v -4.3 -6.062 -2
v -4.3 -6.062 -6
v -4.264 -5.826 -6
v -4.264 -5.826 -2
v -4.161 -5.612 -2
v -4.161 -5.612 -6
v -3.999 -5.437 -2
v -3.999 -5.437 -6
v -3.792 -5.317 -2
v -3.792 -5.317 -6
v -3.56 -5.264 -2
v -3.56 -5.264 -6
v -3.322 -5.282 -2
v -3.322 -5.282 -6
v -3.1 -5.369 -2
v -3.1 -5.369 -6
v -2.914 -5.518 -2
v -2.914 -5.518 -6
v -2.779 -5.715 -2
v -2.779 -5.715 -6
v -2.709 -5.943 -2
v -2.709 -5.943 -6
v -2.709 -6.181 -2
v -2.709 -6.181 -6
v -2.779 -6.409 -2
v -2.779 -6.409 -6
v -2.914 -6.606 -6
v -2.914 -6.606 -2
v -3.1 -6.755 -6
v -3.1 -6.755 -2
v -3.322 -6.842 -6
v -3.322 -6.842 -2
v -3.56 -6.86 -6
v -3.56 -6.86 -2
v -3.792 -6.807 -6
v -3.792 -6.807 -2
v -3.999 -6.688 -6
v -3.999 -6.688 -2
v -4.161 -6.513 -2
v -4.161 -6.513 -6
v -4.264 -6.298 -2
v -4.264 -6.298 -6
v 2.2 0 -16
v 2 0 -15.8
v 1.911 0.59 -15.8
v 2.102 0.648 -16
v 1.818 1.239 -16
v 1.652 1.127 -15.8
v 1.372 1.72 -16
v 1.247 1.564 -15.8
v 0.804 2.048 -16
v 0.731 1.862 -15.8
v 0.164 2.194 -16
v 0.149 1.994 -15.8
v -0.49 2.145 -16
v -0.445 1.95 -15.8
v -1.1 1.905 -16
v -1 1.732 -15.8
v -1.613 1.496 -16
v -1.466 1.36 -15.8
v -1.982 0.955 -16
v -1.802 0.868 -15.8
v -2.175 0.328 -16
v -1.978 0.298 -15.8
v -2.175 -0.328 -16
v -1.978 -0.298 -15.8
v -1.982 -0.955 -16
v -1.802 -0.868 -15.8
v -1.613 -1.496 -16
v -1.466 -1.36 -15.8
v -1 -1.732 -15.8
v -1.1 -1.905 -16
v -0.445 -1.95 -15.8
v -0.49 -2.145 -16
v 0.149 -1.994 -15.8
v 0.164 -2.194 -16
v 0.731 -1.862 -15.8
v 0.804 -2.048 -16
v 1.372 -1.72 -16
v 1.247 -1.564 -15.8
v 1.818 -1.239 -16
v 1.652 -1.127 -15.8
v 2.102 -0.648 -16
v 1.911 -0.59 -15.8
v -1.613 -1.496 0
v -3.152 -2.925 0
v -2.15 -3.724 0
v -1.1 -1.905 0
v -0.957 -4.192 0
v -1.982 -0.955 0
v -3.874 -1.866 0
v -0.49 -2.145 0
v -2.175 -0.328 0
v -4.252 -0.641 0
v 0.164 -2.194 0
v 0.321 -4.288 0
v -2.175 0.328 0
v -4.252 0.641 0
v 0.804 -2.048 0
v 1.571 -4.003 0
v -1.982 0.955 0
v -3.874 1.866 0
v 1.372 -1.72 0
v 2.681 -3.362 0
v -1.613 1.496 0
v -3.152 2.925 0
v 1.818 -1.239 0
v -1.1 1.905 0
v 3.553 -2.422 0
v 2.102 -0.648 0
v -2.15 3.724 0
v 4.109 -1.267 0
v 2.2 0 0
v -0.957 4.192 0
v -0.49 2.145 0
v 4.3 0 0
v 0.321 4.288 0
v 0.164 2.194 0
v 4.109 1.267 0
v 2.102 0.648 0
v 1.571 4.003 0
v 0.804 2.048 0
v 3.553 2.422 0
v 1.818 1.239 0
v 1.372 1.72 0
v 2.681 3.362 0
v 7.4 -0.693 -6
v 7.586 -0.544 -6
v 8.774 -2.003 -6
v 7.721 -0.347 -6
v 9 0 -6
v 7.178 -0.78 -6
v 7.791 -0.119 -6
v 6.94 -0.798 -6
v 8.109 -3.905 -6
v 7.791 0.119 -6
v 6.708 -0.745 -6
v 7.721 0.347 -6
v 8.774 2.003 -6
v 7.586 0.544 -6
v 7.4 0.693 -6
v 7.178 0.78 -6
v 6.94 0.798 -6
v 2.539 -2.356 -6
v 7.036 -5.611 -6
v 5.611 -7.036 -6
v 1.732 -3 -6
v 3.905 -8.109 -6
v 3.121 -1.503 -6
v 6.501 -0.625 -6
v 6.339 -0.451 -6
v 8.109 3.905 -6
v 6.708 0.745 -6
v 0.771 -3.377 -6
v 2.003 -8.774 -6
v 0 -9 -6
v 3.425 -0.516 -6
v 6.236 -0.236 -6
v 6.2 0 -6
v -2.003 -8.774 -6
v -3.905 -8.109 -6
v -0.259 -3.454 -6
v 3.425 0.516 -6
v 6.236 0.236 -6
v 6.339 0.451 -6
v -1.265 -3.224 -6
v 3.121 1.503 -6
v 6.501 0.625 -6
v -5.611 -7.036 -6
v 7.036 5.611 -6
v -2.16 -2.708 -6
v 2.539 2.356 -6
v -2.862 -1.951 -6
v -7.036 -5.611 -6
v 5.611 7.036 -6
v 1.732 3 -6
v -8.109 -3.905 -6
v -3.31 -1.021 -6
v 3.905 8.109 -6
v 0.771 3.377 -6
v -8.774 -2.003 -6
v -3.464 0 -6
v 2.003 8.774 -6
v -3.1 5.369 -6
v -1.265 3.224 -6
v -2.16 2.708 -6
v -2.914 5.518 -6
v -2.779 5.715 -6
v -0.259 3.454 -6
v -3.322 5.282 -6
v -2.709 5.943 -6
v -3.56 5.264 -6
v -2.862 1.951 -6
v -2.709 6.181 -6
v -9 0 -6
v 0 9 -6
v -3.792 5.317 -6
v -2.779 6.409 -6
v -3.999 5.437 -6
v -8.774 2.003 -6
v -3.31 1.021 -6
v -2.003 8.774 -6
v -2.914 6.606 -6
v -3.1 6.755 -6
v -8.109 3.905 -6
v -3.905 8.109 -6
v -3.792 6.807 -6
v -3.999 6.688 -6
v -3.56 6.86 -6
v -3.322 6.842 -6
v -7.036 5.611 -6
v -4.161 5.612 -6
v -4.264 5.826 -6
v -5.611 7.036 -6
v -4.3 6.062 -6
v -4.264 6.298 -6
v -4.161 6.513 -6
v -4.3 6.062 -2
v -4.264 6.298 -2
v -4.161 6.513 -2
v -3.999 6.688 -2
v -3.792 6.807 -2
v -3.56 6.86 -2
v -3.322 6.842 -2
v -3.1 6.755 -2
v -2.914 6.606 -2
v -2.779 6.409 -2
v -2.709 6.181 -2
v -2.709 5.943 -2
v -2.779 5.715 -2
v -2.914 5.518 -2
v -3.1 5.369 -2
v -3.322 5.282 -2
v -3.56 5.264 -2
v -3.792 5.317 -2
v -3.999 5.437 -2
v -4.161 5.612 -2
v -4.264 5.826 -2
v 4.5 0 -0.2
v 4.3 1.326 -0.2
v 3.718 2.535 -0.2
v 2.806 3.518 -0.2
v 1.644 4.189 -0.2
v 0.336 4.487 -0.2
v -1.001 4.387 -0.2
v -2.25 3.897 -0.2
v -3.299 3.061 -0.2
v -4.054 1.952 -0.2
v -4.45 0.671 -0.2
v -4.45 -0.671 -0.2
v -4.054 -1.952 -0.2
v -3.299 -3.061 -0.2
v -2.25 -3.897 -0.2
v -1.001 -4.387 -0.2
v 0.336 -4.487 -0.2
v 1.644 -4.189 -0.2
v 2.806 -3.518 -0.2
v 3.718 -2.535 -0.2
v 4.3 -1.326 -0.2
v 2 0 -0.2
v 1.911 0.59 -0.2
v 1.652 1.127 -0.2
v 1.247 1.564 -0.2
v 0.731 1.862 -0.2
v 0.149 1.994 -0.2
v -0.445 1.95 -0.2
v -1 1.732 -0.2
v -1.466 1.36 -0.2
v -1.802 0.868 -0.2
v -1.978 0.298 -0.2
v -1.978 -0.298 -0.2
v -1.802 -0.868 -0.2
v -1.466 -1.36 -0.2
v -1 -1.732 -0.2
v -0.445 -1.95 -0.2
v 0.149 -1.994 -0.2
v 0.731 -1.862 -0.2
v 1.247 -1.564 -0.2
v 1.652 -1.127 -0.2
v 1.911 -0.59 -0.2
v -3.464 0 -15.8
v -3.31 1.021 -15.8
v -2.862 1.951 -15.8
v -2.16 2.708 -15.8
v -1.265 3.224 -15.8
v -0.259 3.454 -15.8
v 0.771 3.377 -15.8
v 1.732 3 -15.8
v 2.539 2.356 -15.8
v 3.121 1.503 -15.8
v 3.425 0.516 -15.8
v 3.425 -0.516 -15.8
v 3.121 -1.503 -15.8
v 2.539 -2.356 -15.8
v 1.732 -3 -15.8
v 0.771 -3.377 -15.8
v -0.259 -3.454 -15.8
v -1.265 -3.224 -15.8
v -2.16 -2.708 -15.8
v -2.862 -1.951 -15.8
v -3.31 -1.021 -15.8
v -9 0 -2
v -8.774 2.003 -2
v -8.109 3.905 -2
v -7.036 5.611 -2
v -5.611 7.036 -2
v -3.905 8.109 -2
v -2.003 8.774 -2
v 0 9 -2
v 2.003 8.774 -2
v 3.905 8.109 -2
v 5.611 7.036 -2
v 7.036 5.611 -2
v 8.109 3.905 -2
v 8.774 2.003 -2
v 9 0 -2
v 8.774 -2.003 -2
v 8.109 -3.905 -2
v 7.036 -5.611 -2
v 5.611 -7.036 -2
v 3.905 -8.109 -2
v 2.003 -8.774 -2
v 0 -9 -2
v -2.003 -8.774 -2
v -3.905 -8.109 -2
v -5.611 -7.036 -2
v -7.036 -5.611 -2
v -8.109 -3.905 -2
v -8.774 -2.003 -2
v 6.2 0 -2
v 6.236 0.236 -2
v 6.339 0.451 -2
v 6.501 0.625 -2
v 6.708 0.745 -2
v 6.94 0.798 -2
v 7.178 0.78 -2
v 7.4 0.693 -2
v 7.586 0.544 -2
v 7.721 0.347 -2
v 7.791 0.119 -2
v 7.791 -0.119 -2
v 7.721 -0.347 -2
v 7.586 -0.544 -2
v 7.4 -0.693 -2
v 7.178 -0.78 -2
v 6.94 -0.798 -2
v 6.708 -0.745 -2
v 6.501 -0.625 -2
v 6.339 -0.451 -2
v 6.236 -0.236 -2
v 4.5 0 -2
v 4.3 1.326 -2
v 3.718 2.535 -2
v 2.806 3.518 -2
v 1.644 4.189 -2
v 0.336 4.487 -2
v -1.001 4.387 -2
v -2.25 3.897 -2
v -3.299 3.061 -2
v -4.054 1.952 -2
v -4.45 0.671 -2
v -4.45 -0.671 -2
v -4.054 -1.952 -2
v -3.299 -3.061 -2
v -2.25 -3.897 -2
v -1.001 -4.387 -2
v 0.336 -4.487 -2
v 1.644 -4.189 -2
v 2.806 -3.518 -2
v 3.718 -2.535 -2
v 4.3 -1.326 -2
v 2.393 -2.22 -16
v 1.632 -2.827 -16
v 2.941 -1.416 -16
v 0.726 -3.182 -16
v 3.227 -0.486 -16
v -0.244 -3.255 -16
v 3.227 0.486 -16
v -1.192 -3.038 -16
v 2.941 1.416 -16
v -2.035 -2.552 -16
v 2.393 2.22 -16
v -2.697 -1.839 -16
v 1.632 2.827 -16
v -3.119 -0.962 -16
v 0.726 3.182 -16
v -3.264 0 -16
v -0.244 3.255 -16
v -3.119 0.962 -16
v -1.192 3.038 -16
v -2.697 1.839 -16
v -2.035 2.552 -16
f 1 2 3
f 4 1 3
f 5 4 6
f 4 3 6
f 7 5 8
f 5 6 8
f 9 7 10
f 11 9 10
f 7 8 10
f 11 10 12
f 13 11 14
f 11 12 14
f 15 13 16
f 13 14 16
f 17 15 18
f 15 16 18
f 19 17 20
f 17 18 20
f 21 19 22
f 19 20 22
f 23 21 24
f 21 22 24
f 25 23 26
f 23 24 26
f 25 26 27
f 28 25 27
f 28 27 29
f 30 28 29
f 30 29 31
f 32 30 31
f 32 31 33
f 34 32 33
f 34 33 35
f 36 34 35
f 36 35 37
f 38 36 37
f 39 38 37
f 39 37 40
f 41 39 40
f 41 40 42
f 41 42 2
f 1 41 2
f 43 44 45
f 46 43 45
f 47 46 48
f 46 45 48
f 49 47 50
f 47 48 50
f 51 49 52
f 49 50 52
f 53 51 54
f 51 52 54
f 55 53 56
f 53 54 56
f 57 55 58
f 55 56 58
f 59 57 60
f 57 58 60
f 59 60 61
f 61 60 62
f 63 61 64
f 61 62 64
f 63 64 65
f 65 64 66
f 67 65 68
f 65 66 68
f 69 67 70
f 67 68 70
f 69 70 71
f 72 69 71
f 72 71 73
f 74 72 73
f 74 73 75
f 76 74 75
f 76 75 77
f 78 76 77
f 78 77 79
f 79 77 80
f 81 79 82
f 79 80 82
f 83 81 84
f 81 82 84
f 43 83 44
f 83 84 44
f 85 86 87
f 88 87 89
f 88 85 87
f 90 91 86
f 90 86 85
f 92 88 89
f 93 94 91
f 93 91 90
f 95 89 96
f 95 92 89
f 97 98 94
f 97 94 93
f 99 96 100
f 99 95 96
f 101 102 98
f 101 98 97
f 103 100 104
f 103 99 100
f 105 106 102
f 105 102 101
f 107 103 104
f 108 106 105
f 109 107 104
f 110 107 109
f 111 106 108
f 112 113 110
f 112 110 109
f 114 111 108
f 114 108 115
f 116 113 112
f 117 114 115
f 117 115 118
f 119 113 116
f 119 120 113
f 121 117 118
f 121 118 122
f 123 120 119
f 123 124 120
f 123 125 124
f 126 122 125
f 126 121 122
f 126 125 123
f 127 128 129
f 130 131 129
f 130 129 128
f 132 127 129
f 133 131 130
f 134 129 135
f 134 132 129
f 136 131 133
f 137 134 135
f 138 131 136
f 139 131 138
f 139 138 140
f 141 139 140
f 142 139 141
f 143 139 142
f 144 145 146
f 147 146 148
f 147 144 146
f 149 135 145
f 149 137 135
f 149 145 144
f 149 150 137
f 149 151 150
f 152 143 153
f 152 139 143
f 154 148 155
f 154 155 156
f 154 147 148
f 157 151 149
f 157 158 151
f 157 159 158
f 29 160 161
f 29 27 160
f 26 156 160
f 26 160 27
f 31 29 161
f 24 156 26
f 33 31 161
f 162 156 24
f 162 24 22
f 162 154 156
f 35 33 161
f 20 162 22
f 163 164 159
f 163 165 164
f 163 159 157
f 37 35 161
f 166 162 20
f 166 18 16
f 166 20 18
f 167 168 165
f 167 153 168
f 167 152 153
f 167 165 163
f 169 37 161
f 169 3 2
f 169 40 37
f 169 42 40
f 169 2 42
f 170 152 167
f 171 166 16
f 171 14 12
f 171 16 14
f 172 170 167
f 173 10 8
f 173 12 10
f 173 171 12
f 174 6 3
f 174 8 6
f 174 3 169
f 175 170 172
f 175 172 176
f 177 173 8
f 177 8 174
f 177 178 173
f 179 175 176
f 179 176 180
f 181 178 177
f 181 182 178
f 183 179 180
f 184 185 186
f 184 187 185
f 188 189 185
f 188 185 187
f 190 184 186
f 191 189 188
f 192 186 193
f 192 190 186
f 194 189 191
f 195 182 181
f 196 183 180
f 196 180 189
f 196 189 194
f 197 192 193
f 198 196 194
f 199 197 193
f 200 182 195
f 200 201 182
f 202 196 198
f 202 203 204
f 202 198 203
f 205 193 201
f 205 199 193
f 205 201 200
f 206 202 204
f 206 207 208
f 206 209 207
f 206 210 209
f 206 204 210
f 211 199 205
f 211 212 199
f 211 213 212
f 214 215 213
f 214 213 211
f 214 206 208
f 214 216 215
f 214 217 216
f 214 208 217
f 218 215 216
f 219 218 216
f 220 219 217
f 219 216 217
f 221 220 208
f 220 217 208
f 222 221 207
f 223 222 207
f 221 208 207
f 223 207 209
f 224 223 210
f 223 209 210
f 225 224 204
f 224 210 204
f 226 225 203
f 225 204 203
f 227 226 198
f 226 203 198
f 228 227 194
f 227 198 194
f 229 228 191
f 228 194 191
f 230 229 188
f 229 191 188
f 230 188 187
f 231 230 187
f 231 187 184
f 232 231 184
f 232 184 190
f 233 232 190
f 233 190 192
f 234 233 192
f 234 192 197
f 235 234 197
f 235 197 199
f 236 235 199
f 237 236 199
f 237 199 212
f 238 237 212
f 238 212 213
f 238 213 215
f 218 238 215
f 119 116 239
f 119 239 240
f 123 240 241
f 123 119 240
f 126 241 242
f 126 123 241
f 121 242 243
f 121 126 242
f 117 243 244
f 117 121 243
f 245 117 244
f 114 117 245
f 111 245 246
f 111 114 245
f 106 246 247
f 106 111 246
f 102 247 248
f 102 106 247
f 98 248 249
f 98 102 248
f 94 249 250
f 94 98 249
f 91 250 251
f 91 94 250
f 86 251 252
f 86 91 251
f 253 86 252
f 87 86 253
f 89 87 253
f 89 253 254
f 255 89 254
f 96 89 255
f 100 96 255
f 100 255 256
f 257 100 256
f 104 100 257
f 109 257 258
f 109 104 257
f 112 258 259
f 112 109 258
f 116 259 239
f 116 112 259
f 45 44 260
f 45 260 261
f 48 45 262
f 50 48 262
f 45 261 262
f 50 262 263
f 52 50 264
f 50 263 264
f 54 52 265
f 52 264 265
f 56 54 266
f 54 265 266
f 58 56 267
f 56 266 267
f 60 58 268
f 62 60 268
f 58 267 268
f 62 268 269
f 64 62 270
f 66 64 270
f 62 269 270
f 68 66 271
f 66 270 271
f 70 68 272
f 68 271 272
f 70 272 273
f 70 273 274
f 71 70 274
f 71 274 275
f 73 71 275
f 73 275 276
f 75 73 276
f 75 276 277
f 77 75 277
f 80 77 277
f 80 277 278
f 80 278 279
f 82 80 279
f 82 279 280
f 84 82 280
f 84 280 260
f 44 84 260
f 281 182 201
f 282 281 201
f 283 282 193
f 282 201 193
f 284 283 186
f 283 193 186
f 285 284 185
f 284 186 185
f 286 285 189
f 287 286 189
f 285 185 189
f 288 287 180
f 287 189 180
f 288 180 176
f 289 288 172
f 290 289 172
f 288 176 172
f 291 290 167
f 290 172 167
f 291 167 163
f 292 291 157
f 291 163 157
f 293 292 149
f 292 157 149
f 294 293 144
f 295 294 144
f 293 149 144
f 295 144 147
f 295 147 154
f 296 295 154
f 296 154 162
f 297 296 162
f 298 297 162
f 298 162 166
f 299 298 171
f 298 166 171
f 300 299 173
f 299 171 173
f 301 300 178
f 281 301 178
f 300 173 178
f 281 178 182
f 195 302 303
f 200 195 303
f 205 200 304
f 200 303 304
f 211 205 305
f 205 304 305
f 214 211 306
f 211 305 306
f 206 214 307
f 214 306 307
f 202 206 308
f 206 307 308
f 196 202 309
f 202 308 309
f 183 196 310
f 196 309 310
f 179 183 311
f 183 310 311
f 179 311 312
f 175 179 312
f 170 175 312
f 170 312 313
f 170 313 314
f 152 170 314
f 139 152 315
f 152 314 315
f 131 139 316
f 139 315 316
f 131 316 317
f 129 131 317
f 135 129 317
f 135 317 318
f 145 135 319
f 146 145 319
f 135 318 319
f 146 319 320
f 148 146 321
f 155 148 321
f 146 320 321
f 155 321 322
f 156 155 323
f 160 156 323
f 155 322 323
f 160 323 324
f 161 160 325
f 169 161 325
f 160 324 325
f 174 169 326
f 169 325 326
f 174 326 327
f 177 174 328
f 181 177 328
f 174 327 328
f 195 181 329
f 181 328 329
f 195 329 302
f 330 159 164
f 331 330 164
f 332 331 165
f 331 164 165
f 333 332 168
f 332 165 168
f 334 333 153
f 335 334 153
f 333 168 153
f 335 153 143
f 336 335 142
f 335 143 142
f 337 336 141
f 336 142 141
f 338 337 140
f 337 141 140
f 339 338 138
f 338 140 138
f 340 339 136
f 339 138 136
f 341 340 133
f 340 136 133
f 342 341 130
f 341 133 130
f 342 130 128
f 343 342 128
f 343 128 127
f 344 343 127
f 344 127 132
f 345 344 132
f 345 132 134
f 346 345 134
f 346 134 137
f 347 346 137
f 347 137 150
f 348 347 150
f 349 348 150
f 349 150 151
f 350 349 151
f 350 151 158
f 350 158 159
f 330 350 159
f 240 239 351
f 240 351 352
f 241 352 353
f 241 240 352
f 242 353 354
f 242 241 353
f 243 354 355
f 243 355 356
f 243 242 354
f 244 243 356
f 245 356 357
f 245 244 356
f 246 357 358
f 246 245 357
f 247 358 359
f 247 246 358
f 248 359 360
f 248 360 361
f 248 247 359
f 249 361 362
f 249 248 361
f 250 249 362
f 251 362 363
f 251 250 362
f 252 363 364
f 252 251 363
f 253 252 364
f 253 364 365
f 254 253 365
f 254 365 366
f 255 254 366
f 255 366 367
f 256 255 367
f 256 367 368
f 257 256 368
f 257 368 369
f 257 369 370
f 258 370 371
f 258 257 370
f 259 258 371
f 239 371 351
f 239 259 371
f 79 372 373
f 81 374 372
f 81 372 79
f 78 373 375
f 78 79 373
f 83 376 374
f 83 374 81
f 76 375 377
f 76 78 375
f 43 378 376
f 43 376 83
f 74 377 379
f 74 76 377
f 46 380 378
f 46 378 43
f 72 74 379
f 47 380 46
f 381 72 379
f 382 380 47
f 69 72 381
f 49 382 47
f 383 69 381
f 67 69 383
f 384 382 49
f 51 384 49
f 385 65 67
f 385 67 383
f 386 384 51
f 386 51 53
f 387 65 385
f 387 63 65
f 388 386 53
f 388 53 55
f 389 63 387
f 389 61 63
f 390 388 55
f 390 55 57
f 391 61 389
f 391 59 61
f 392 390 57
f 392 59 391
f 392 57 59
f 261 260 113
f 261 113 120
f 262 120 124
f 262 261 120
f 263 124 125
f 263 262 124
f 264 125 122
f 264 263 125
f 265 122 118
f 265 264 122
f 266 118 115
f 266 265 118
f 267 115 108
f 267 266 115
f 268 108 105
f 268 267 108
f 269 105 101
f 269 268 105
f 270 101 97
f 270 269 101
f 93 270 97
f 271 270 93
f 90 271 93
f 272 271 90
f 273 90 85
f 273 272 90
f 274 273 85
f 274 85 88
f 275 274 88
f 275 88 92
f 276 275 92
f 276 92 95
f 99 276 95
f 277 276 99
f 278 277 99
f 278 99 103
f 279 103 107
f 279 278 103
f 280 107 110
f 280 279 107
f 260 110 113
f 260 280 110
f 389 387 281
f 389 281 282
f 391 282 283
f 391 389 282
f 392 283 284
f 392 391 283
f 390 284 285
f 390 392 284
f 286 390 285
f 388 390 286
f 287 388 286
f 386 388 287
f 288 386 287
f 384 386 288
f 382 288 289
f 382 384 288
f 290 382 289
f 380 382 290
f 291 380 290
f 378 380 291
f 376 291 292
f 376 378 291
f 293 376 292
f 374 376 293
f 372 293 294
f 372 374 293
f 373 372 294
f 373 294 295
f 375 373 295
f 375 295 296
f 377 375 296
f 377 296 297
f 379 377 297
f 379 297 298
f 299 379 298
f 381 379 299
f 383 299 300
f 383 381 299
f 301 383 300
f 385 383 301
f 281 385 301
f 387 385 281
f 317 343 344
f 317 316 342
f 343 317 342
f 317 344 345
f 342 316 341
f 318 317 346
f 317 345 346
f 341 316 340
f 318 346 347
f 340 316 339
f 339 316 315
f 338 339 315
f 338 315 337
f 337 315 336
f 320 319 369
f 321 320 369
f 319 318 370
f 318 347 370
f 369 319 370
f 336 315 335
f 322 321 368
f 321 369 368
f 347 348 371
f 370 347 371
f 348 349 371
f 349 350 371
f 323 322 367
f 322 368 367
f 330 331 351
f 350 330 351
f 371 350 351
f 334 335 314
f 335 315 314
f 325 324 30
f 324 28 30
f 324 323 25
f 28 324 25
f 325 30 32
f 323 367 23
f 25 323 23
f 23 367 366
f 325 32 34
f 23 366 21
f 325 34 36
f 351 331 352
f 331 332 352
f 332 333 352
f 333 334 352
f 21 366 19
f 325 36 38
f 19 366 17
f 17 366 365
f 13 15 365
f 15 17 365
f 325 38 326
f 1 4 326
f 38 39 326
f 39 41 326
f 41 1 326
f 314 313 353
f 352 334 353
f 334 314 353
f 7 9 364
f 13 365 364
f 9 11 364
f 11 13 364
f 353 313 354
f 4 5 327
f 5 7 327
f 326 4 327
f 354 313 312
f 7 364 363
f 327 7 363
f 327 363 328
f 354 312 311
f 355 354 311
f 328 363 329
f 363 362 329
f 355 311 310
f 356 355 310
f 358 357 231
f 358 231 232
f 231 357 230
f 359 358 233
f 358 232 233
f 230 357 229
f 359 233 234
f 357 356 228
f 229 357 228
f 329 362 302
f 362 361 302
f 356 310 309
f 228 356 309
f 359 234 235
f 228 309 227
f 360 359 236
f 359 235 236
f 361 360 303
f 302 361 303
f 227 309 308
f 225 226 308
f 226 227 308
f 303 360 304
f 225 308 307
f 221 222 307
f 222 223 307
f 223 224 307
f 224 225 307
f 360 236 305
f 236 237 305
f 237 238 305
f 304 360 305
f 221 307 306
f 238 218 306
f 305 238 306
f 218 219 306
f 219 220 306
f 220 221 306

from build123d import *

# Parameters (mm, degrees)
SKETCH1_R             = 4.5
BOSS_EXTRUDE1_DEPTH   = 2
SKETCH2_R             = 9
BOSS_EXTRUDE2_DEPTH   = 4
SKETCH3_R             = 3.463787736
BOSS_EXTRUDE3_DEPTH   = 10
M2X0_4_TAPPED_HOLE1_D = 1.6
SKETCH7_R             = 2
CUT_EXTRUDE3_DEPTH    = 17
CHAMFER1_SIZE         = 0.2


with BuildPart() as part:
    # Sketch1 → Boss-Extrude1 (new body)
    with BuildSketch(Plane.XY):
        Circle(SKETCH1_R)
    extrude(amount=-BOSS_EXTRUDE1_DEPTH)

    # Sketch2 → Boss-Extrude2 (add)
    with BuildSketch(Plane(origin=(0, 0, -2), x_dir=(-1, 0, 0), z_dir=(0, 0, -1))):
        Circle(SKETCH2_R)
    extrude(amount=BOSS_EXTRUDE2_DEPTH)

    # Sketch3 → Boss-Extrude3 (add)
    with BuildSketch(Plane(origin=(0, 0, -6), x_dir=(-1, 0, 0), z_dir=(0, 0, -1))):
        Circle(SKETCH3_R)
    extrude(amount=BOSS_EXTRUDE3_DEPTH)

    # M2x0.4 Tapped Hole1 (through all)
    with Locations(Plane.XY.offset(-2)):
        with Locations((-3.5, 6.062177826), (-3.5, -6.062177826), (7, 0)):
            Hole(M2X0_4_TAPPED_HOLE1_D / 2)

    # Sketch7 → Cut-Extrude3 (cut, through all)
    with BuildSketch(Plane.XY):
        Circle(SKETCH7_R)
    extrude(amount=-CUT_EXTRUDE3_DEPTH, mode=Mode.SUBTRACT)

    # Chamfer1
    chamfer1_edges = [part.edges().sort_by_distance(p)[0] for p in [
        (3.463787736, 0, -16),
        (-4.5, 0, 0),
        (-2, 0, -16),
        (-2, 0, 0),
    ]]
    chamfer(chamfer1_edges, length=CHAMFER1_SIZE)


solid = part.part
